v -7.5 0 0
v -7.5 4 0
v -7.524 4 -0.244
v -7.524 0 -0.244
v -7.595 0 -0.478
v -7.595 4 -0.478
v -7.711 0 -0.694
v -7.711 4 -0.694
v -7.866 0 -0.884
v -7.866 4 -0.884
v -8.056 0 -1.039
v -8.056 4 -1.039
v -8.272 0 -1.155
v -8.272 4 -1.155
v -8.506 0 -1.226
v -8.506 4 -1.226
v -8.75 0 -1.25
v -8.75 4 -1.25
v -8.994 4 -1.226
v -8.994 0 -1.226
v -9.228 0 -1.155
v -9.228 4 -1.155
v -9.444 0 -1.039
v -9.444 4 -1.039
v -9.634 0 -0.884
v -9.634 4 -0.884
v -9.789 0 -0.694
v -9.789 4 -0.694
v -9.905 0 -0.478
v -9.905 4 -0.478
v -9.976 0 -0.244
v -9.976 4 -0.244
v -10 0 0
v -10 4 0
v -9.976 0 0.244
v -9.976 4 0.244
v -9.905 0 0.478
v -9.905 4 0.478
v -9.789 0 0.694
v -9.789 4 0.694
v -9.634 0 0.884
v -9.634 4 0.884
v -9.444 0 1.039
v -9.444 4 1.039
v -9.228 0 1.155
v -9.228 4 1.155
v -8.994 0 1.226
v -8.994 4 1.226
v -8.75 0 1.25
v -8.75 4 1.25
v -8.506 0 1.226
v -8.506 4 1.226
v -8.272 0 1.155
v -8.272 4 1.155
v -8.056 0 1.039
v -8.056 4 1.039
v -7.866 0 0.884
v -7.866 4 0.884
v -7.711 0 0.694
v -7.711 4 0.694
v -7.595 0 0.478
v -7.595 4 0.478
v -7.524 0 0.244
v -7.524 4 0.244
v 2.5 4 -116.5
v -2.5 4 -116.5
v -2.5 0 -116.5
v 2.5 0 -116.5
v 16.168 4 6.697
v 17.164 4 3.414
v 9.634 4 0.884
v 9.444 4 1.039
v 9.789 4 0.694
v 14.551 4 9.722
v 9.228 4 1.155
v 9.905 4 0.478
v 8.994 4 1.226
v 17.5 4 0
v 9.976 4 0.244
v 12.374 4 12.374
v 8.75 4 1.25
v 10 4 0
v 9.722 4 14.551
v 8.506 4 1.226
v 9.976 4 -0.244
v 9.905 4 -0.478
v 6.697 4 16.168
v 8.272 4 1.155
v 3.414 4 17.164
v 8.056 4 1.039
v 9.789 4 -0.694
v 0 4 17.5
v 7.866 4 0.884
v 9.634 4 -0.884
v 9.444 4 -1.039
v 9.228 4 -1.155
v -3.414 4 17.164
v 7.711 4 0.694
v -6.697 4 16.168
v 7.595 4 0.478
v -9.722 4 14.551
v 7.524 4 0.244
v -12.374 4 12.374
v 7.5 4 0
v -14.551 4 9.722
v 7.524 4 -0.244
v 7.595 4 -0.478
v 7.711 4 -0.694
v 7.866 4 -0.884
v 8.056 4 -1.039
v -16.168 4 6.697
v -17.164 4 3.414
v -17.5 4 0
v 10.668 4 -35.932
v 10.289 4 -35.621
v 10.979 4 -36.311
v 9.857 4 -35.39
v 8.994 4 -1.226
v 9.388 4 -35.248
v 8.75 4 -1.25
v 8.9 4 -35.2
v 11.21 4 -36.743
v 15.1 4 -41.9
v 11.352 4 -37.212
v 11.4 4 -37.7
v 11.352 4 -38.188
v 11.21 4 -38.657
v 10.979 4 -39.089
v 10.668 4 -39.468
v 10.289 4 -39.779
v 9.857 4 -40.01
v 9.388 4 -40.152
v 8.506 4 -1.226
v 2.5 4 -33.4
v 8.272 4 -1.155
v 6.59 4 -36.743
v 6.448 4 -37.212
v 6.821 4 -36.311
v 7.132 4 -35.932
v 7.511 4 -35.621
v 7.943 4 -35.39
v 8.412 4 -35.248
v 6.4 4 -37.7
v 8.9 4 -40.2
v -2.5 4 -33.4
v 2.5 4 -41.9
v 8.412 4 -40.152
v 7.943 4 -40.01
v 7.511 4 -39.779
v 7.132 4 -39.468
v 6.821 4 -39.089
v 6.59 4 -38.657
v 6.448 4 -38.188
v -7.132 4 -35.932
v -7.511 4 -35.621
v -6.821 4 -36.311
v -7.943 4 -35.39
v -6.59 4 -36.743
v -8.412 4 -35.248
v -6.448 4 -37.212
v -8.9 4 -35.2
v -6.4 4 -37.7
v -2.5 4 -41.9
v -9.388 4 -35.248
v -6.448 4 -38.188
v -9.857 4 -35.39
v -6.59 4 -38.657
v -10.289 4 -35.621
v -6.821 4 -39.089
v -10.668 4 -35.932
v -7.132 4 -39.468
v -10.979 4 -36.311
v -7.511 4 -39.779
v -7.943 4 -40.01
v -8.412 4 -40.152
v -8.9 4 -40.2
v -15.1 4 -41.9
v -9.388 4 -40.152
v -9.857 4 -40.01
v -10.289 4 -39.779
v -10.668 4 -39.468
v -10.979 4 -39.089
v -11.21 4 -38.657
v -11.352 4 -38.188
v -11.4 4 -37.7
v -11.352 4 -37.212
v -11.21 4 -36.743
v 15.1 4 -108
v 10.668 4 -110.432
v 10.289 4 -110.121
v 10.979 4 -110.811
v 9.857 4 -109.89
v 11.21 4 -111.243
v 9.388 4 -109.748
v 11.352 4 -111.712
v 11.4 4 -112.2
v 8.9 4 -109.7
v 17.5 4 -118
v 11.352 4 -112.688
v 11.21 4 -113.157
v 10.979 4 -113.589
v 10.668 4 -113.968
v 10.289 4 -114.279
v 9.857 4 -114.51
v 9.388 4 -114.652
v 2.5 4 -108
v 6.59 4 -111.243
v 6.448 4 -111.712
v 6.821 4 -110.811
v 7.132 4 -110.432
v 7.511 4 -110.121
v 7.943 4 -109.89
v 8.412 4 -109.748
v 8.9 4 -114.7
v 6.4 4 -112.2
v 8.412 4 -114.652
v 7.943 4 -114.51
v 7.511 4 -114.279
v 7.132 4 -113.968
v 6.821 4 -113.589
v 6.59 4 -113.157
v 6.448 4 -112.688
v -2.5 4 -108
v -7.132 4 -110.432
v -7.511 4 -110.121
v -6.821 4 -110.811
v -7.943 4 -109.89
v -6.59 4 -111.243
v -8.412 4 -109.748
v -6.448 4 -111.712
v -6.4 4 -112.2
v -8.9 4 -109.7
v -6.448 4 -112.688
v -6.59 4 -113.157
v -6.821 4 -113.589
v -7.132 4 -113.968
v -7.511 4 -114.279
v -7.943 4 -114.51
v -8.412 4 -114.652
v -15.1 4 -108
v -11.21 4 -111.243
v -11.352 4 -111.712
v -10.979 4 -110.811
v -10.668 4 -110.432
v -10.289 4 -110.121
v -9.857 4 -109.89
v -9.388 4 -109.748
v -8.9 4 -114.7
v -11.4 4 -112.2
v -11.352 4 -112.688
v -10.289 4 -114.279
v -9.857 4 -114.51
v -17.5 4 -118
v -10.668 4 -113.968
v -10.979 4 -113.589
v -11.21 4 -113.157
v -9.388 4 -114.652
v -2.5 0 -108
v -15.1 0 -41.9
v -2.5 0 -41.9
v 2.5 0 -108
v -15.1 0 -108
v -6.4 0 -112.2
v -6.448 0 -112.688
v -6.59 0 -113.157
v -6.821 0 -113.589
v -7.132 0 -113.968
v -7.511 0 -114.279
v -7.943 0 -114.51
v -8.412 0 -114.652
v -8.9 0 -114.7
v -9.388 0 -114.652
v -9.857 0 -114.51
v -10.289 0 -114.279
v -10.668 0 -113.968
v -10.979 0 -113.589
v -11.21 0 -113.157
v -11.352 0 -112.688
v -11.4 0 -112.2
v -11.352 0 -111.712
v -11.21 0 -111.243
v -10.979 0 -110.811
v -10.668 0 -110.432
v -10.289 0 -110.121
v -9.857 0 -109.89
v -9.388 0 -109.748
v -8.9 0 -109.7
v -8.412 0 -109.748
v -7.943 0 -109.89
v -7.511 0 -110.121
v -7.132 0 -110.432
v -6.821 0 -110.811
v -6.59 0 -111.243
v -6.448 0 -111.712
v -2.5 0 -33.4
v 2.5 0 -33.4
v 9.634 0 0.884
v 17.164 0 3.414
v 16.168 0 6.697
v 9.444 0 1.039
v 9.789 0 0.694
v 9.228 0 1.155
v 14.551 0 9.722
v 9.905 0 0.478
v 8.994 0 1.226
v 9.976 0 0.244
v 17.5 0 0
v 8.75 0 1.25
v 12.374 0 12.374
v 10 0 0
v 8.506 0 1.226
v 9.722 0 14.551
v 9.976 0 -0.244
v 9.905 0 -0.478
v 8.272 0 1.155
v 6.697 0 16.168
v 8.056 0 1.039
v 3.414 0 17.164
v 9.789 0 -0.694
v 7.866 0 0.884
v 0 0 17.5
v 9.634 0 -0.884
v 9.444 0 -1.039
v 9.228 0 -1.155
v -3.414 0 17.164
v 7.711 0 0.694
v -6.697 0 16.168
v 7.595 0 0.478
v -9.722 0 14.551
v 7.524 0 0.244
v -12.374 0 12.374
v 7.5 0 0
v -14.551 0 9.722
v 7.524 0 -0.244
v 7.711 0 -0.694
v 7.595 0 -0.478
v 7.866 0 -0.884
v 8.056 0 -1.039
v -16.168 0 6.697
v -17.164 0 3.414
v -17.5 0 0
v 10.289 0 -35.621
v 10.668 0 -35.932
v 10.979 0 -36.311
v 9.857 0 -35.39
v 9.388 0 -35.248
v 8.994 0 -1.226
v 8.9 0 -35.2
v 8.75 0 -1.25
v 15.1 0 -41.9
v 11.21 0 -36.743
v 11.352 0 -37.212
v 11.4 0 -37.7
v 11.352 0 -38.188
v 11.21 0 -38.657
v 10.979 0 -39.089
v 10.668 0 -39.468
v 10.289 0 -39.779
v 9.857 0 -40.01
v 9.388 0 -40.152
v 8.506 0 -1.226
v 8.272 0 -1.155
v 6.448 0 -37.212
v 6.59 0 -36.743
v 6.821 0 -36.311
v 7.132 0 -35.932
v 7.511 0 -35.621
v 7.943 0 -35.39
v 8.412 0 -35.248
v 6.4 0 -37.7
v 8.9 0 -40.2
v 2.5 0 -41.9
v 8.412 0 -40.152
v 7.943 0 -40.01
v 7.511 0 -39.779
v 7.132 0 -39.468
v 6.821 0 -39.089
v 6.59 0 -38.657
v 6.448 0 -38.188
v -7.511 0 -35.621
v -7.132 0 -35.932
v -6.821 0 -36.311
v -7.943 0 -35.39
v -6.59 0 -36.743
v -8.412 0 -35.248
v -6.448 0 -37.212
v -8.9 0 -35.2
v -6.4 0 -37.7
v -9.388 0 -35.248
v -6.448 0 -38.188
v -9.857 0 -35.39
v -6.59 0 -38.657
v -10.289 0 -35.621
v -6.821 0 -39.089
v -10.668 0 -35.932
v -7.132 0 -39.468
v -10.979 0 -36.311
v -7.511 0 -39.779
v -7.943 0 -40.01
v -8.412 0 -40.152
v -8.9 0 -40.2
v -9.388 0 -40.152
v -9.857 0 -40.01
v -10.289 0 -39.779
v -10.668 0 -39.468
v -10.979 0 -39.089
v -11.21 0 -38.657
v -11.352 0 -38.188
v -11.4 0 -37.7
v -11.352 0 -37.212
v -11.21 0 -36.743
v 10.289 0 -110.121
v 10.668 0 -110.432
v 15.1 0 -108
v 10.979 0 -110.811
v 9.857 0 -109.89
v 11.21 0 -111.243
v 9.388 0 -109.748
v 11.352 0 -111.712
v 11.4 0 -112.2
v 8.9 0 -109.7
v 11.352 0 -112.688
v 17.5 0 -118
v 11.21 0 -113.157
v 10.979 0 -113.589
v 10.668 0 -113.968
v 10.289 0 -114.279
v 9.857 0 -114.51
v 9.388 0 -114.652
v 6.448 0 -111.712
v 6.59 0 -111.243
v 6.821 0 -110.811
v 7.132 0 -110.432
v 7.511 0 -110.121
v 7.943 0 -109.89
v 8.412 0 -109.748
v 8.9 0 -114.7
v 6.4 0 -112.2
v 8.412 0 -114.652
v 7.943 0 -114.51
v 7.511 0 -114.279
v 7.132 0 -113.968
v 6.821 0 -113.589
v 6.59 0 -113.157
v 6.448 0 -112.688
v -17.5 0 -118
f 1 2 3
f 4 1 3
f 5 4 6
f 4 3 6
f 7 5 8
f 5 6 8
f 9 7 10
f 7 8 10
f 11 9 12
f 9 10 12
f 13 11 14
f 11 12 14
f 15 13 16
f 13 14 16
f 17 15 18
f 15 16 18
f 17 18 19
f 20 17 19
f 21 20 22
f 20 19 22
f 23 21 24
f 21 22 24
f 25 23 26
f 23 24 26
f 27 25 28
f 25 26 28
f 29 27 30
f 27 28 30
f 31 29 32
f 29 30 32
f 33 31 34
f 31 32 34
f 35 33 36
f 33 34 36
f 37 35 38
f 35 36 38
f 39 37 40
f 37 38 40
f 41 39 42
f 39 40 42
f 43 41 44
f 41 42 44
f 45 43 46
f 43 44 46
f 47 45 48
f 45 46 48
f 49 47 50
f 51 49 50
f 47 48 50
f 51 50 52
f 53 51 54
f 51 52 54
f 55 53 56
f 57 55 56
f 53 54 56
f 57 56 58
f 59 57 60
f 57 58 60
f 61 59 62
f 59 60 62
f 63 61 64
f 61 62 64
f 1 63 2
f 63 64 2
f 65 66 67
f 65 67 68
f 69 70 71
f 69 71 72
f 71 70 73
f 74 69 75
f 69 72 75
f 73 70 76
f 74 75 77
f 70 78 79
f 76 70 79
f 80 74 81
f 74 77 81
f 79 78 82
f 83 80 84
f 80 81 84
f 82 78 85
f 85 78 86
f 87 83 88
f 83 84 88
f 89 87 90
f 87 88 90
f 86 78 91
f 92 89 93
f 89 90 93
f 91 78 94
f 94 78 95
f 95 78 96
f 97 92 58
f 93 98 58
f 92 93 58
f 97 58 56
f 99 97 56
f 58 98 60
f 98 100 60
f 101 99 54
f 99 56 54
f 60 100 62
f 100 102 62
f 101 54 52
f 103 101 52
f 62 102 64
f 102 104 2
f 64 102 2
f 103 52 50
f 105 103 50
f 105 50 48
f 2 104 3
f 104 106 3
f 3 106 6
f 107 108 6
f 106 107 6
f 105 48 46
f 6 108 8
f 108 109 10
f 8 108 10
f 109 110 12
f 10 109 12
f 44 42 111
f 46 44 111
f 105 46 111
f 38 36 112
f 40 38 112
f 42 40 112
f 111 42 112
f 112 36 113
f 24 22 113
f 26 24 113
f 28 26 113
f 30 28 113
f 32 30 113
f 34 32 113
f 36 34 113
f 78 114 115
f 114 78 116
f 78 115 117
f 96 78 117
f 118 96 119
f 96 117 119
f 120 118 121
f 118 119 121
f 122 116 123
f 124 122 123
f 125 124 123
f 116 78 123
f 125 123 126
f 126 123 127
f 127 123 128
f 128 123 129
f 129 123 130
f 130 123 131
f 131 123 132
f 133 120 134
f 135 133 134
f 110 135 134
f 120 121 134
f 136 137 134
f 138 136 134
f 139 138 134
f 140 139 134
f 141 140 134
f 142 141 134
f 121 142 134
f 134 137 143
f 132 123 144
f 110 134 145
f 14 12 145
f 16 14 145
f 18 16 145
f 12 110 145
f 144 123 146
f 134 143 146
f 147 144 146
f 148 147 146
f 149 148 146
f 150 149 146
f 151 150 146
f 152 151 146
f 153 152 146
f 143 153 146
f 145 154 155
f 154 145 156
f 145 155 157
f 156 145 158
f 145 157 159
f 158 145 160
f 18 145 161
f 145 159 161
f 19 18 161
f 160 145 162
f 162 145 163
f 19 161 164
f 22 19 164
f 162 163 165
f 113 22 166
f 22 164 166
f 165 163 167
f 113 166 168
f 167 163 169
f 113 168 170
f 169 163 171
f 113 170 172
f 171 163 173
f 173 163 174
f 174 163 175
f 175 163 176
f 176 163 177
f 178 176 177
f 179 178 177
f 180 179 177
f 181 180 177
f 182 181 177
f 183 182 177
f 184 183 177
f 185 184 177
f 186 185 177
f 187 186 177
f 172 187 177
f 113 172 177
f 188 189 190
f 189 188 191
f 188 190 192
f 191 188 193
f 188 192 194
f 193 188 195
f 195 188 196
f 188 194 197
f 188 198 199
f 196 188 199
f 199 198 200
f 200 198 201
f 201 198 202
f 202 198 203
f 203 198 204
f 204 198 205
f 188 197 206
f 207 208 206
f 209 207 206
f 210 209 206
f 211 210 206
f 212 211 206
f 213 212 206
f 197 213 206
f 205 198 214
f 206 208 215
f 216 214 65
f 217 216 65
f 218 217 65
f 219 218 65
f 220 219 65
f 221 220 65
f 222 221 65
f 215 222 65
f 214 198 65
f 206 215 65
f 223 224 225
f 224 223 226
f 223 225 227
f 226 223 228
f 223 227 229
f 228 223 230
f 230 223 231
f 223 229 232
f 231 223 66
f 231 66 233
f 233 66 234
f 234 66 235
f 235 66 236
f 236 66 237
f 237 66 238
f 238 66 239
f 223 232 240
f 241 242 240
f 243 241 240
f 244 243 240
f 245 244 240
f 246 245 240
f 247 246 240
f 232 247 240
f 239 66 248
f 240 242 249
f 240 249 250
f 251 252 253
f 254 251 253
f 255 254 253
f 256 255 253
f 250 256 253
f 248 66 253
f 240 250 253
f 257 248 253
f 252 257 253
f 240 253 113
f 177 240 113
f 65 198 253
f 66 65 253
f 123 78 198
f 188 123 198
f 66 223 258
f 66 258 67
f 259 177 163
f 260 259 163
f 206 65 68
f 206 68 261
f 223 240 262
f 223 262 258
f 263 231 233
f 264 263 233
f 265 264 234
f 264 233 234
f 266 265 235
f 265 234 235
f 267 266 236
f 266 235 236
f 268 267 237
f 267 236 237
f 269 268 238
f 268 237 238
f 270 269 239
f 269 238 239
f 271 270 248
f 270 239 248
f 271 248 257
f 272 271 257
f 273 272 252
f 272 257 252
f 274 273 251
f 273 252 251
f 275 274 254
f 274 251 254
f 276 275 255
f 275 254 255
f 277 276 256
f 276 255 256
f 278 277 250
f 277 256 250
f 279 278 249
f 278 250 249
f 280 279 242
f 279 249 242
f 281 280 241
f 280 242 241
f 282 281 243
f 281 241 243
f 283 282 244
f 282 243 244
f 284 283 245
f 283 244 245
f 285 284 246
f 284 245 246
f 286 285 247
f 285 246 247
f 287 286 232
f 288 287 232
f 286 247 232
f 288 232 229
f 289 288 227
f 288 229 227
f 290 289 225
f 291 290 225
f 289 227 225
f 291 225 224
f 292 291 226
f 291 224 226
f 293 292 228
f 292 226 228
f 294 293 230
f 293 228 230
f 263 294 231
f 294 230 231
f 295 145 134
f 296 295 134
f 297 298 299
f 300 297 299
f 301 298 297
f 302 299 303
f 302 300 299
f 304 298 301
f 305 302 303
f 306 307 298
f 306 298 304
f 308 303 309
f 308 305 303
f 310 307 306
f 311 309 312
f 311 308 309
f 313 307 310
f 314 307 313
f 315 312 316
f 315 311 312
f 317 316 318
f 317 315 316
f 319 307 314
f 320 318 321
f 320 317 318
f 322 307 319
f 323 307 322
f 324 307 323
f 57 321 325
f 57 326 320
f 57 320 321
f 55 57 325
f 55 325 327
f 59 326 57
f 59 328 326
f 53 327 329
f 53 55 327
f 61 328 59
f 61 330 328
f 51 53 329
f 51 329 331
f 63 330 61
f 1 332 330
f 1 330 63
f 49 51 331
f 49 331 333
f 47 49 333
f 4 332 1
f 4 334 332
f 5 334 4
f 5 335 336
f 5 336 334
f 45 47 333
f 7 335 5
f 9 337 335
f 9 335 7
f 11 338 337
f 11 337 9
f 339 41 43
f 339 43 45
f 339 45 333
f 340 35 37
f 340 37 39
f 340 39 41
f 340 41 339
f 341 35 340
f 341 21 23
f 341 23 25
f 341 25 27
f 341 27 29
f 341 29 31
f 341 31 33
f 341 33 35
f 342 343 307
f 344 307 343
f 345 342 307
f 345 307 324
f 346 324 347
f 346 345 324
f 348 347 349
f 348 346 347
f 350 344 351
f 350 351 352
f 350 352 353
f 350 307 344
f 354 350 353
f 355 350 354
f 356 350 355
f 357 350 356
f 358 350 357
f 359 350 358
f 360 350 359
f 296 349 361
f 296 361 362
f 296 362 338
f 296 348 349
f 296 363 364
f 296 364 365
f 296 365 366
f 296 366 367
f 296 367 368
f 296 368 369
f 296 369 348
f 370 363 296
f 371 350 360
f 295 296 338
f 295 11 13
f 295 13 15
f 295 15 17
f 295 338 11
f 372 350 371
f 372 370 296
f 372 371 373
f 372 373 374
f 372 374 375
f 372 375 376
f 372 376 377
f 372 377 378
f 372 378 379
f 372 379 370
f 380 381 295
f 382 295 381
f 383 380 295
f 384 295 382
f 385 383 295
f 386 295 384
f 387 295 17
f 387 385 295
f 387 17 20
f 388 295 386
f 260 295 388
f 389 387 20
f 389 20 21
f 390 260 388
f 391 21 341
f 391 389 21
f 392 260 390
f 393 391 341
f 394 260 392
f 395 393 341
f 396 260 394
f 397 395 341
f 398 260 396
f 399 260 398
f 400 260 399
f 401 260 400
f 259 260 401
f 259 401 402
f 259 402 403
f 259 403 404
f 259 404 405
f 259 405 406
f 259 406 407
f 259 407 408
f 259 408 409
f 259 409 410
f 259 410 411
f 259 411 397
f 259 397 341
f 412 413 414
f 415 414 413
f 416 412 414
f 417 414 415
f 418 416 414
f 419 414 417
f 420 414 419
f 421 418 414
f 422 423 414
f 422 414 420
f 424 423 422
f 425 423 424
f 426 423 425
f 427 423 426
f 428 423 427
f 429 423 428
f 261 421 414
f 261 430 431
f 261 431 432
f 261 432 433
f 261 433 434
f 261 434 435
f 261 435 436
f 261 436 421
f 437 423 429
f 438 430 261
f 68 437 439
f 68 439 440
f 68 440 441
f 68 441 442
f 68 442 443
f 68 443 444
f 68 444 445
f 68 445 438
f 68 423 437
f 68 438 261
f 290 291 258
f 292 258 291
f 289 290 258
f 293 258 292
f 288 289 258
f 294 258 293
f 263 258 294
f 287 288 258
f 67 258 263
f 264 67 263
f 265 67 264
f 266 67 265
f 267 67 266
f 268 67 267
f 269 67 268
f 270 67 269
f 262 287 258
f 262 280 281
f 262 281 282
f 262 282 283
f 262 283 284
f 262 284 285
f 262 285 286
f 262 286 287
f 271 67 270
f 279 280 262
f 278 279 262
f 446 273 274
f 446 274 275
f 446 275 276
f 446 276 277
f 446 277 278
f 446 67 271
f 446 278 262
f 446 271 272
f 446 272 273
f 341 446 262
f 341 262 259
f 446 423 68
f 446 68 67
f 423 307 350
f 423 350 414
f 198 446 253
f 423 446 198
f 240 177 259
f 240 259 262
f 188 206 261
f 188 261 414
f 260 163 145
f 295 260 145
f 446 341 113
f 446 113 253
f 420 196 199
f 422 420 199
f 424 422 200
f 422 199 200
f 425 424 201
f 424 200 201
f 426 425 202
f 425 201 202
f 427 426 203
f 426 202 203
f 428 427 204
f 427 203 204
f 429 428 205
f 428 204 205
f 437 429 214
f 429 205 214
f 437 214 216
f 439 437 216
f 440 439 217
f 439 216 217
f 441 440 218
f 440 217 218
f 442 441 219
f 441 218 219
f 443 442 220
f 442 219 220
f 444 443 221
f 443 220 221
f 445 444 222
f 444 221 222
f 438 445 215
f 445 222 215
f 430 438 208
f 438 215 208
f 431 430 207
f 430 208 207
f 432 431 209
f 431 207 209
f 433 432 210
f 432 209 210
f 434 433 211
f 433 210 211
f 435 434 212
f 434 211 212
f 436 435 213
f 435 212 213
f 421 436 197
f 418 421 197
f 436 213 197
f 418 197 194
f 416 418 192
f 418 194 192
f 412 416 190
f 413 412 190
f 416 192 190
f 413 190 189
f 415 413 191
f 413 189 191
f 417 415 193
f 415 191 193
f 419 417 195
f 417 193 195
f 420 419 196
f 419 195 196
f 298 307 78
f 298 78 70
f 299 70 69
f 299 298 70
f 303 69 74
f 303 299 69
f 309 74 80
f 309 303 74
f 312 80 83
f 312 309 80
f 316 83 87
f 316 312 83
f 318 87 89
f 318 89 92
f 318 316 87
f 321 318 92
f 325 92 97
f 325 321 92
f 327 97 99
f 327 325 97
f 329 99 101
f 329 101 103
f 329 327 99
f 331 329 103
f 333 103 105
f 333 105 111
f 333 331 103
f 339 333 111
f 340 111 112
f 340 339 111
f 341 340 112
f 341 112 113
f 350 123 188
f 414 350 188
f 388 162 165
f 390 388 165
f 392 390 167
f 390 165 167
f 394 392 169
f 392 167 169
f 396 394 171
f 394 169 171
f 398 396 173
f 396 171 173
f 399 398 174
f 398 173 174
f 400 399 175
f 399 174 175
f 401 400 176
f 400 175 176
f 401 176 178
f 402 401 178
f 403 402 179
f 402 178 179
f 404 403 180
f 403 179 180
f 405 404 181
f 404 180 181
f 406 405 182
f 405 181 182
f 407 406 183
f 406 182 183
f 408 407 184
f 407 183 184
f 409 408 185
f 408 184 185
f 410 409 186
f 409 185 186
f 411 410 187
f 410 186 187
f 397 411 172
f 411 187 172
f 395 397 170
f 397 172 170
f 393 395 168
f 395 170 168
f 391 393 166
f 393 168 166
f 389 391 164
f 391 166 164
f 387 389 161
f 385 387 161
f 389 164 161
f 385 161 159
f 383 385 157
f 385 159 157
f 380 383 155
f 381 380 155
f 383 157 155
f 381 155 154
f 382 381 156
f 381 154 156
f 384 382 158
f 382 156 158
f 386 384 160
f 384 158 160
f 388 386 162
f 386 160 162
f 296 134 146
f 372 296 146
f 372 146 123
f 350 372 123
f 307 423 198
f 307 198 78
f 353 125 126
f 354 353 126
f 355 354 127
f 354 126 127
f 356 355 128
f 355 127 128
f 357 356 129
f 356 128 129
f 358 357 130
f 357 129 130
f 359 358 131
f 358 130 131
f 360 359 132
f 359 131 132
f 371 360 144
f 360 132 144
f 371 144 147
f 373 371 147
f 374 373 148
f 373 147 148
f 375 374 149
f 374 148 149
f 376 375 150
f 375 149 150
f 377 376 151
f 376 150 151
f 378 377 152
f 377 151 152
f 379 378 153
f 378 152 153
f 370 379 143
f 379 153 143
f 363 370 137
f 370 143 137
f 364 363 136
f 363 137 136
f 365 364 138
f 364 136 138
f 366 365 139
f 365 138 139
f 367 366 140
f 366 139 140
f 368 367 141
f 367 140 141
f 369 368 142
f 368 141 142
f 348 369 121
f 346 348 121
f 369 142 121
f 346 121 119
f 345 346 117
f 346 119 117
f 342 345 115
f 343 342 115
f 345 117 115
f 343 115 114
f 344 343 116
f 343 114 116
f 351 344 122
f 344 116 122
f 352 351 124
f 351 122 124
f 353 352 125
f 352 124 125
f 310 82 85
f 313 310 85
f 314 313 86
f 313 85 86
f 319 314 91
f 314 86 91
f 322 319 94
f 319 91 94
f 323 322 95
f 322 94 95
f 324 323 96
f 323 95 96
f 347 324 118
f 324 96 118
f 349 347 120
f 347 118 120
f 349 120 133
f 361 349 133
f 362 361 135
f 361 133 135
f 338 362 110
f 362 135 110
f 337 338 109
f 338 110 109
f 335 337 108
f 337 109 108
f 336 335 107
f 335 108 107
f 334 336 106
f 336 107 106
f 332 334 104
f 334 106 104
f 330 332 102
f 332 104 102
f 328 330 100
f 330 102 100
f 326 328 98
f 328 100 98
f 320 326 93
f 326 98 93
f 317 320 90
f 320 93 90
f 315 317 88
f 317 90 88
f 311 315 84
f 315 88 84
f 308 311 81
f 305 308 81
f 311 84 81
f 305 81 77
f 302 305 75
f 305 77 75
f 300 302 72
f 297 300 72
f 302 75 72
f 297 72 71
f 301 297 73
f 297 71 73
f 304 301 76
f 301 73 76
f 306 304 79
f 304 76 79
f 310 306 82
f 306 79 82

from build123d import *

# Parameters (mm, degrees)
BOSS_EXTRUDE1_DEPTH = 4
SKETCH2_R           = 1.25
CUT_EXTRUDE1_DEPTH  = 4
SKETCH6_R           = 2.5
SKETCH6_W           = 30.2
SKETCH6_H           = 66.1
CUT_EXTRUDE5_DEPTH  = 4
CUT_EXTRUDE6_DEPTH  = 4


with BuildPart() as part:
    # Sketch1 → Boss-Extrude1 (new body)
    with BuildSketch(Plane(origin=(0, 0, 0), x_dir=(1, 0, 0), z_dir=(0, 1, 0))):
        with BuildLine():
            Line((-17.5, 0), (-17.5, 118))
            Line((-17.5, 118), (17.5, 118))
            Line((17.5, 118), (17.5, 0))
            ThreePointArc((17.5, 0), (0, -17.5), (-17.5, 0))
        make_face()
    extrude(amount=BOSS_EXTRUDE1_DEPTH)

    # Sketch2 → Cut-Extrude1 (cut)
    with BuildSketch(Plane(origin=(0, 4, 0), x_dir=(1, 0, 0), z_dir=(0, 1, 0))):
        with Locations((-8.75, 0)):
            Circle(SKETCH2_R)
        with Locations((8.75, 0)):
            Circle(SKETCH2_R)
    extrude(amount=-CUT_EXTRUDE1_DEPTH, mode=Mode.SUBTRACT)

    # Sketch6 → Cut-Extrude5 (cut)
    with BuildSketch(Plane(origin=(0, 4, 0), x_dir=(1, 0, 0), z_dir=(0, 1, 0))):
        with Locations((-8.9, 37.7)):
            Circle(SKETCH6_R)
        with Locations((8.9, 37.7)):
            Circle(SKETCH6_R)
        with Locations((8.9, 112.2)):
            Circle(SKETCH6_R)
        with Locations((-8.9, 112.2)):
            Circle(SKETCH6_R)
        with Locations((0, 74.95)):
            Rectangle(SKETCH6_W, SKETCH6_H)
    extrude(amount=-CUT_EXTRUDE5_DEPTH, mode=Mode.SUBTRACT)

    # Sketch7 → Cut-Extrude6 (cut)
    with BuildSketch(Plane(origin=(0, 4, 0), x_dir=(1, 0, 0), z_dir=(0, 1, 0))):
        Polygon((0, 41.9), (-2.5, 41.9), (-2.5, 33.4), (2.5, 33.4), (2.5, 41.9), align=None)
        Polygon((2.5, 108), (0, 108), (-2.5, 108), (-2.5, 116.5), (2.5, 116.5), align=None)
    extrude(amount=-CUT_EXTRUDE6_DEPTH, mode=Mode.SUBTRACT)


solid = part.part
